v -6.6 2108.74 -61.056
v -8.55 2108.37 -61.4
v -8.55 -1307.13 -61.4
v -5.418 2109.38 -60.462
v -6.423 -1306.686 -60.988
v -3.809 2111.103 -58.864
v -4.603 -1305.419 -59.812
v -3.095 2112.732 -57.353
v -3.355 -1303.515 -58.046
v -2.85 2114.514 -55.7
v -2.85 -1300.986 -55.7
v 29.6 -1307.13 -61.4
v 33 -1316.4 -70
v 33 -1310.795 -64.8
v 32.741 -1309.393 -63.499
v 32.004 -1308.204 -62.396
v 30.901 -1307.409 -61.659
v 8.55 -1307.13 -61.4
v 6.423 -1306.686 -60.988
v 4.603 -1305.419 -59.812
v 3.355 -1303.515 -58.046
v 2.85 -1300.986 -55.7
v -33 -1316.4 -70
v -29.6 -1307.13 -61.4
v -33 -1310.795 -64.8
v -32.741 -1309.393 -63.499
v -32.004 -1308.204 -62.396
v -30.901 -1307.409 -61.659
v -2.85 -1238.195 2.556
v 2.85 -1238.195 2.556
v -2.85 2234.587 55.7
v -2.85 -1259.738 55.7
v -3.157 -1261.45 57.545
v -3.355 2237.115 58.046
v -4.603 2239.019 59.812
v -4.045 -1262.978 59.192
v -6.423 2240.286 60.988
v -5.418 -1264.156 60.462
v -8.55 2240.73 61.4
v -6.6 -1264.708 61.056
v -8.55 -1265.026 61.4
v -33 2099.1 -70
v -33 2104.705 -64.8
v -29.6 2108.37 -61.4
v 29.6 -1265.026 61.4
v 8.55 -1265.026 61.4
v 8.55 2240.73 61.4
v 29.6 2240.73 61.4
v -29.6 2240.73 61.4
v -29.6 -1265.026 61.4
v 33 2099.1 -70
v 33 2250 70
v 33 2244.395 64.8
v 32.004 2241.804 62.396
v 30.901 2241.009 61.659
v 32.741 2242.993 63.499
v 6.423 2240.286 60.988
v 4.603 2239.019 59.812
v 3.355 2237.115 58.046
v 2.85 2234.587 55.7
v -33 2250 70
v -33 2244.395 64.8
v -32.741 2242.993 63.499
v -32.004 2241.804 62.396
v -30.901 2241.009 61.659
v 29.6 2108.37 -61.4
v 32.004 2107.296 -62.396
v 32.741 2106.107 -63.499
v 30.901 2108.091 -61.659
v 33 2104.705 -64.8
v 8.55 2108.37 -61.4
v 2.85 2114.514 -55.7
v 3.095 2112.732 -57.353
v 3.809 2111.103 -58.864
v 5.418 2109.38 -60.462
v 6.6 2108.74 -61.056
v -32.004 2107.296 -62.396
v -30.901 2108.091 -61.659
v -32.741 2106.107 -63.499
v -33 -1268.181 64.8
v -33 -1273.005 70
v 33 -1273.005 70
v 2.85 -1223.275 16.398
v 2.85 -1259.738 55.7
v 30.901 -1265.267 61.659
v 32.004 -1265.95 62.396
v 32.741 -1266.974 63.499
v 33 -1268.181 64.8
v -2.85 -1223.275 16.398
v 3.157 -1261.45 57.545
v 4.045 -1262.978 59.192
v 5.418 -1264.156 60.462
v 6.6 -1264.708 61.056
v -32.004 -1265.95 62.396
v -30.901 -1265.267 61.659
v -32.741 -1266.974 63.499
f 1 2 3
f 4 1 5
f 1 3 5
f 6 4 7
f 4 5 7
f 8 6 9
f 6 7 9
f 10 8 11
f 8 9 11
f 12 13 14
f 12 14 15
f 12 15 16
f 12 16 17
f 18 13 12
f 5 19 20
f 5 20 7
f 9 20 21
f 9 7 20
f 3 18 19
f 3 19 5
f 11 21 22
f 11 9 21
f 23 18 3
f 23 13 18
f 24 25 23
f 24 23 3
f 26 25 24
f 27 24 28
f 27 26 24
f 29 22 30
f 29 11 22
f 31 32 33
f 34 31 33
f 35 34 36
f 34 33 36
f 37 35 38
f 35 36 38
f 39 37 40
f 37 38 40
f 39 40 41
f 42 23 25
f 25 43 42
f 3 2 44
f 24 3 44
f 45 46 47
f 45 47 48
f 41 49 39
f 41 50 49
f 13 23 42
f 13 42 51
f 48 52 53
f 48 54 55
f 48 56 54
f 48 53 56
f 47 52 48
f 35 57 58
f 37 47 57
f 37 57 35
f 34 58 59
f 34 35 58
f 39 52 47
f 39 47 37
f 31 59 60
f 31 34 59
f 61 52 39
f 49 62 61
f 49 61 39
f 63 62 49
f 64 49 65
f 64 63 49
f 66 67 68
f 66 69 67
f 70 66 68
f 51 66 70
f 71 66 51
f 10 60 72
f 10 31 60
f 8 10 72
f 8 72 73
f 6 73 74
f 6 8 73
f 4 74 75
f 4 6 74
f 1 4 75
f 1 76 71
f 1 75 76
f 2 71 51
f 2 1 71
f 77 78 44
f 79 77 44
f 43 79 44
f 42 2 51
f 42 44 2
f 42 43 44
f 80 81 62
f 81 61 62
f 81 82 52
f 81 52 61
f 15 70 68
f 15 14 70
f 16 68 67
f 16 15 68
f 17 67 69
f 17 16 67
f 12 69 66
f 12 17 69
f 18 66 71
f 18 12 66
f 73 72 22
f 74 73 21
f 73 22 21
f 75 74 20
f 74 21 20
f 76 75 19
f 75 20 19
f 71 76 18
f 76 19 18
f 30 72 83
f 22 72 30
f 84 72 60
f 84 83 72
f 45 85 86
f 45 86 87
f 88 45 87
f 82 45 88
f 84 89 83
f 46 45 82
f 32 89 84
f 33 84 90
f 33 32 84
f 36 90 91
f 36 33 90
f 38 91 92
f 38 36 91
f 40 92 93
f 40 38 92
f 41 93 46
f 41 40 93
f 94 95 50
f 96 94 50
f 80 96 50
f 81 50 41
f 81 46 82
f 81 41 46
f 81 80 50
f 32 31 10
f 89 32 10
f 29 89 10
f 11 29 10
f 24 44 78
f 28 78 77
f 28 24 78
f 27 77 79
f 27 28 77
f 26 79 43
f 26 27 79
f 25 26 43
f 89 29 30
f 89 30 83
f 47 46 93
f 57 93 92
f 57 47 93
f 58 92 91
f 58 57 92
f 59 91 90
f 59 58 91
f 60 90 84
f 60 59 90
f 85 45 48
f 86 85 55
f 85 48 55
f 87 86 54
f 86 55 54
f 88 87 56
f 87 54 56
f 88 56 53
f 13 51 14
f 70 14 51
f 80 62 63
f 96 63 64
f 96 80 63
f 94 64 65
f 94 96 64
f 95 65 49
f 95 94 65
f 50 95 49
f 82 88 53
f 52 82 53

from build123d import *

# Parameters (mm, degrees)
F1_DEPTH      = 2250
F3_R          = 5.7
F4_DEPTH      = 33.001
F4_DEPTH_BACK = 33.001
F5_R          = 3.4


with BuildPart() as f1:
    # F0 (on Front) → F1 (new body, symmetric)
    with BuildSketch(Plane.XZ):
        Polygon((33, 70), (-33, 70), (-33, 61.4), (-2.85, 61.4), (-2.85, -61.4), (-33, -61.4), (-33, -70), (33, -70), (33, -61.4), (2.85, -61.4), (2.85, 61.4), (33, 61.4), align=None)
    extrude(amount=F1_DEPTH, both=True)

    # F3
    f3_edges = [f1.edges().sort_by_distance(p)[0] for p in [
        (2.85, 0, 61.4),
        (-2.85, 0, 61.4),
        (-2.85, 0, -61.4),
        (2.85, 0, -61.4),
    ]]
    fillet(f3_edges, radius=F3_R)

    # F2 (on Right) → F4 (cut, two sides)
    with BuildSketch(Plane.YZ) as f4_sk:
        Polygon((2250, 70), (423.9320166035, -1624.1670688611), (2250, -1624.1670688611), align=None)
        Polygon((-2250, -1624.1670688611), (423.9320166035, -1624.1670688611), (-1075.5892073123, -70), (-1316.3998283823, -70), (-1238.1949375756, 2.5559792041), (-1223.2751472361, 16.3980802087), (-1273.0052822386, 70), (-1300.7673281235, 70), (-2250, 70), align=None)
        Polygon((2744.5735228311, 942.9355427669), (2904.1863174438, 1091.019153595), (2607.1863174438, 1091.019153595), align=None)
    extrude(amount=-F4_DEPTH, mode=Mode.SUBTRACT)
    extrude(f4_sk.sketch, amount=F4_DEPTH_BACK, mode=Mode.SUBTRACT)

    # F5
    f5_edges = [f1.edges().sort_by_distance(p)[0] for p in [
        (33, 487.85198, 61.4),
        (-33, 487.85198, 61.4),
        (33, 400.619733, -61.4),
        (-33, 400.619733, -61.4),
    ]]
    fillet(f5_edges, radius=F5_R)


solid = f1.part
